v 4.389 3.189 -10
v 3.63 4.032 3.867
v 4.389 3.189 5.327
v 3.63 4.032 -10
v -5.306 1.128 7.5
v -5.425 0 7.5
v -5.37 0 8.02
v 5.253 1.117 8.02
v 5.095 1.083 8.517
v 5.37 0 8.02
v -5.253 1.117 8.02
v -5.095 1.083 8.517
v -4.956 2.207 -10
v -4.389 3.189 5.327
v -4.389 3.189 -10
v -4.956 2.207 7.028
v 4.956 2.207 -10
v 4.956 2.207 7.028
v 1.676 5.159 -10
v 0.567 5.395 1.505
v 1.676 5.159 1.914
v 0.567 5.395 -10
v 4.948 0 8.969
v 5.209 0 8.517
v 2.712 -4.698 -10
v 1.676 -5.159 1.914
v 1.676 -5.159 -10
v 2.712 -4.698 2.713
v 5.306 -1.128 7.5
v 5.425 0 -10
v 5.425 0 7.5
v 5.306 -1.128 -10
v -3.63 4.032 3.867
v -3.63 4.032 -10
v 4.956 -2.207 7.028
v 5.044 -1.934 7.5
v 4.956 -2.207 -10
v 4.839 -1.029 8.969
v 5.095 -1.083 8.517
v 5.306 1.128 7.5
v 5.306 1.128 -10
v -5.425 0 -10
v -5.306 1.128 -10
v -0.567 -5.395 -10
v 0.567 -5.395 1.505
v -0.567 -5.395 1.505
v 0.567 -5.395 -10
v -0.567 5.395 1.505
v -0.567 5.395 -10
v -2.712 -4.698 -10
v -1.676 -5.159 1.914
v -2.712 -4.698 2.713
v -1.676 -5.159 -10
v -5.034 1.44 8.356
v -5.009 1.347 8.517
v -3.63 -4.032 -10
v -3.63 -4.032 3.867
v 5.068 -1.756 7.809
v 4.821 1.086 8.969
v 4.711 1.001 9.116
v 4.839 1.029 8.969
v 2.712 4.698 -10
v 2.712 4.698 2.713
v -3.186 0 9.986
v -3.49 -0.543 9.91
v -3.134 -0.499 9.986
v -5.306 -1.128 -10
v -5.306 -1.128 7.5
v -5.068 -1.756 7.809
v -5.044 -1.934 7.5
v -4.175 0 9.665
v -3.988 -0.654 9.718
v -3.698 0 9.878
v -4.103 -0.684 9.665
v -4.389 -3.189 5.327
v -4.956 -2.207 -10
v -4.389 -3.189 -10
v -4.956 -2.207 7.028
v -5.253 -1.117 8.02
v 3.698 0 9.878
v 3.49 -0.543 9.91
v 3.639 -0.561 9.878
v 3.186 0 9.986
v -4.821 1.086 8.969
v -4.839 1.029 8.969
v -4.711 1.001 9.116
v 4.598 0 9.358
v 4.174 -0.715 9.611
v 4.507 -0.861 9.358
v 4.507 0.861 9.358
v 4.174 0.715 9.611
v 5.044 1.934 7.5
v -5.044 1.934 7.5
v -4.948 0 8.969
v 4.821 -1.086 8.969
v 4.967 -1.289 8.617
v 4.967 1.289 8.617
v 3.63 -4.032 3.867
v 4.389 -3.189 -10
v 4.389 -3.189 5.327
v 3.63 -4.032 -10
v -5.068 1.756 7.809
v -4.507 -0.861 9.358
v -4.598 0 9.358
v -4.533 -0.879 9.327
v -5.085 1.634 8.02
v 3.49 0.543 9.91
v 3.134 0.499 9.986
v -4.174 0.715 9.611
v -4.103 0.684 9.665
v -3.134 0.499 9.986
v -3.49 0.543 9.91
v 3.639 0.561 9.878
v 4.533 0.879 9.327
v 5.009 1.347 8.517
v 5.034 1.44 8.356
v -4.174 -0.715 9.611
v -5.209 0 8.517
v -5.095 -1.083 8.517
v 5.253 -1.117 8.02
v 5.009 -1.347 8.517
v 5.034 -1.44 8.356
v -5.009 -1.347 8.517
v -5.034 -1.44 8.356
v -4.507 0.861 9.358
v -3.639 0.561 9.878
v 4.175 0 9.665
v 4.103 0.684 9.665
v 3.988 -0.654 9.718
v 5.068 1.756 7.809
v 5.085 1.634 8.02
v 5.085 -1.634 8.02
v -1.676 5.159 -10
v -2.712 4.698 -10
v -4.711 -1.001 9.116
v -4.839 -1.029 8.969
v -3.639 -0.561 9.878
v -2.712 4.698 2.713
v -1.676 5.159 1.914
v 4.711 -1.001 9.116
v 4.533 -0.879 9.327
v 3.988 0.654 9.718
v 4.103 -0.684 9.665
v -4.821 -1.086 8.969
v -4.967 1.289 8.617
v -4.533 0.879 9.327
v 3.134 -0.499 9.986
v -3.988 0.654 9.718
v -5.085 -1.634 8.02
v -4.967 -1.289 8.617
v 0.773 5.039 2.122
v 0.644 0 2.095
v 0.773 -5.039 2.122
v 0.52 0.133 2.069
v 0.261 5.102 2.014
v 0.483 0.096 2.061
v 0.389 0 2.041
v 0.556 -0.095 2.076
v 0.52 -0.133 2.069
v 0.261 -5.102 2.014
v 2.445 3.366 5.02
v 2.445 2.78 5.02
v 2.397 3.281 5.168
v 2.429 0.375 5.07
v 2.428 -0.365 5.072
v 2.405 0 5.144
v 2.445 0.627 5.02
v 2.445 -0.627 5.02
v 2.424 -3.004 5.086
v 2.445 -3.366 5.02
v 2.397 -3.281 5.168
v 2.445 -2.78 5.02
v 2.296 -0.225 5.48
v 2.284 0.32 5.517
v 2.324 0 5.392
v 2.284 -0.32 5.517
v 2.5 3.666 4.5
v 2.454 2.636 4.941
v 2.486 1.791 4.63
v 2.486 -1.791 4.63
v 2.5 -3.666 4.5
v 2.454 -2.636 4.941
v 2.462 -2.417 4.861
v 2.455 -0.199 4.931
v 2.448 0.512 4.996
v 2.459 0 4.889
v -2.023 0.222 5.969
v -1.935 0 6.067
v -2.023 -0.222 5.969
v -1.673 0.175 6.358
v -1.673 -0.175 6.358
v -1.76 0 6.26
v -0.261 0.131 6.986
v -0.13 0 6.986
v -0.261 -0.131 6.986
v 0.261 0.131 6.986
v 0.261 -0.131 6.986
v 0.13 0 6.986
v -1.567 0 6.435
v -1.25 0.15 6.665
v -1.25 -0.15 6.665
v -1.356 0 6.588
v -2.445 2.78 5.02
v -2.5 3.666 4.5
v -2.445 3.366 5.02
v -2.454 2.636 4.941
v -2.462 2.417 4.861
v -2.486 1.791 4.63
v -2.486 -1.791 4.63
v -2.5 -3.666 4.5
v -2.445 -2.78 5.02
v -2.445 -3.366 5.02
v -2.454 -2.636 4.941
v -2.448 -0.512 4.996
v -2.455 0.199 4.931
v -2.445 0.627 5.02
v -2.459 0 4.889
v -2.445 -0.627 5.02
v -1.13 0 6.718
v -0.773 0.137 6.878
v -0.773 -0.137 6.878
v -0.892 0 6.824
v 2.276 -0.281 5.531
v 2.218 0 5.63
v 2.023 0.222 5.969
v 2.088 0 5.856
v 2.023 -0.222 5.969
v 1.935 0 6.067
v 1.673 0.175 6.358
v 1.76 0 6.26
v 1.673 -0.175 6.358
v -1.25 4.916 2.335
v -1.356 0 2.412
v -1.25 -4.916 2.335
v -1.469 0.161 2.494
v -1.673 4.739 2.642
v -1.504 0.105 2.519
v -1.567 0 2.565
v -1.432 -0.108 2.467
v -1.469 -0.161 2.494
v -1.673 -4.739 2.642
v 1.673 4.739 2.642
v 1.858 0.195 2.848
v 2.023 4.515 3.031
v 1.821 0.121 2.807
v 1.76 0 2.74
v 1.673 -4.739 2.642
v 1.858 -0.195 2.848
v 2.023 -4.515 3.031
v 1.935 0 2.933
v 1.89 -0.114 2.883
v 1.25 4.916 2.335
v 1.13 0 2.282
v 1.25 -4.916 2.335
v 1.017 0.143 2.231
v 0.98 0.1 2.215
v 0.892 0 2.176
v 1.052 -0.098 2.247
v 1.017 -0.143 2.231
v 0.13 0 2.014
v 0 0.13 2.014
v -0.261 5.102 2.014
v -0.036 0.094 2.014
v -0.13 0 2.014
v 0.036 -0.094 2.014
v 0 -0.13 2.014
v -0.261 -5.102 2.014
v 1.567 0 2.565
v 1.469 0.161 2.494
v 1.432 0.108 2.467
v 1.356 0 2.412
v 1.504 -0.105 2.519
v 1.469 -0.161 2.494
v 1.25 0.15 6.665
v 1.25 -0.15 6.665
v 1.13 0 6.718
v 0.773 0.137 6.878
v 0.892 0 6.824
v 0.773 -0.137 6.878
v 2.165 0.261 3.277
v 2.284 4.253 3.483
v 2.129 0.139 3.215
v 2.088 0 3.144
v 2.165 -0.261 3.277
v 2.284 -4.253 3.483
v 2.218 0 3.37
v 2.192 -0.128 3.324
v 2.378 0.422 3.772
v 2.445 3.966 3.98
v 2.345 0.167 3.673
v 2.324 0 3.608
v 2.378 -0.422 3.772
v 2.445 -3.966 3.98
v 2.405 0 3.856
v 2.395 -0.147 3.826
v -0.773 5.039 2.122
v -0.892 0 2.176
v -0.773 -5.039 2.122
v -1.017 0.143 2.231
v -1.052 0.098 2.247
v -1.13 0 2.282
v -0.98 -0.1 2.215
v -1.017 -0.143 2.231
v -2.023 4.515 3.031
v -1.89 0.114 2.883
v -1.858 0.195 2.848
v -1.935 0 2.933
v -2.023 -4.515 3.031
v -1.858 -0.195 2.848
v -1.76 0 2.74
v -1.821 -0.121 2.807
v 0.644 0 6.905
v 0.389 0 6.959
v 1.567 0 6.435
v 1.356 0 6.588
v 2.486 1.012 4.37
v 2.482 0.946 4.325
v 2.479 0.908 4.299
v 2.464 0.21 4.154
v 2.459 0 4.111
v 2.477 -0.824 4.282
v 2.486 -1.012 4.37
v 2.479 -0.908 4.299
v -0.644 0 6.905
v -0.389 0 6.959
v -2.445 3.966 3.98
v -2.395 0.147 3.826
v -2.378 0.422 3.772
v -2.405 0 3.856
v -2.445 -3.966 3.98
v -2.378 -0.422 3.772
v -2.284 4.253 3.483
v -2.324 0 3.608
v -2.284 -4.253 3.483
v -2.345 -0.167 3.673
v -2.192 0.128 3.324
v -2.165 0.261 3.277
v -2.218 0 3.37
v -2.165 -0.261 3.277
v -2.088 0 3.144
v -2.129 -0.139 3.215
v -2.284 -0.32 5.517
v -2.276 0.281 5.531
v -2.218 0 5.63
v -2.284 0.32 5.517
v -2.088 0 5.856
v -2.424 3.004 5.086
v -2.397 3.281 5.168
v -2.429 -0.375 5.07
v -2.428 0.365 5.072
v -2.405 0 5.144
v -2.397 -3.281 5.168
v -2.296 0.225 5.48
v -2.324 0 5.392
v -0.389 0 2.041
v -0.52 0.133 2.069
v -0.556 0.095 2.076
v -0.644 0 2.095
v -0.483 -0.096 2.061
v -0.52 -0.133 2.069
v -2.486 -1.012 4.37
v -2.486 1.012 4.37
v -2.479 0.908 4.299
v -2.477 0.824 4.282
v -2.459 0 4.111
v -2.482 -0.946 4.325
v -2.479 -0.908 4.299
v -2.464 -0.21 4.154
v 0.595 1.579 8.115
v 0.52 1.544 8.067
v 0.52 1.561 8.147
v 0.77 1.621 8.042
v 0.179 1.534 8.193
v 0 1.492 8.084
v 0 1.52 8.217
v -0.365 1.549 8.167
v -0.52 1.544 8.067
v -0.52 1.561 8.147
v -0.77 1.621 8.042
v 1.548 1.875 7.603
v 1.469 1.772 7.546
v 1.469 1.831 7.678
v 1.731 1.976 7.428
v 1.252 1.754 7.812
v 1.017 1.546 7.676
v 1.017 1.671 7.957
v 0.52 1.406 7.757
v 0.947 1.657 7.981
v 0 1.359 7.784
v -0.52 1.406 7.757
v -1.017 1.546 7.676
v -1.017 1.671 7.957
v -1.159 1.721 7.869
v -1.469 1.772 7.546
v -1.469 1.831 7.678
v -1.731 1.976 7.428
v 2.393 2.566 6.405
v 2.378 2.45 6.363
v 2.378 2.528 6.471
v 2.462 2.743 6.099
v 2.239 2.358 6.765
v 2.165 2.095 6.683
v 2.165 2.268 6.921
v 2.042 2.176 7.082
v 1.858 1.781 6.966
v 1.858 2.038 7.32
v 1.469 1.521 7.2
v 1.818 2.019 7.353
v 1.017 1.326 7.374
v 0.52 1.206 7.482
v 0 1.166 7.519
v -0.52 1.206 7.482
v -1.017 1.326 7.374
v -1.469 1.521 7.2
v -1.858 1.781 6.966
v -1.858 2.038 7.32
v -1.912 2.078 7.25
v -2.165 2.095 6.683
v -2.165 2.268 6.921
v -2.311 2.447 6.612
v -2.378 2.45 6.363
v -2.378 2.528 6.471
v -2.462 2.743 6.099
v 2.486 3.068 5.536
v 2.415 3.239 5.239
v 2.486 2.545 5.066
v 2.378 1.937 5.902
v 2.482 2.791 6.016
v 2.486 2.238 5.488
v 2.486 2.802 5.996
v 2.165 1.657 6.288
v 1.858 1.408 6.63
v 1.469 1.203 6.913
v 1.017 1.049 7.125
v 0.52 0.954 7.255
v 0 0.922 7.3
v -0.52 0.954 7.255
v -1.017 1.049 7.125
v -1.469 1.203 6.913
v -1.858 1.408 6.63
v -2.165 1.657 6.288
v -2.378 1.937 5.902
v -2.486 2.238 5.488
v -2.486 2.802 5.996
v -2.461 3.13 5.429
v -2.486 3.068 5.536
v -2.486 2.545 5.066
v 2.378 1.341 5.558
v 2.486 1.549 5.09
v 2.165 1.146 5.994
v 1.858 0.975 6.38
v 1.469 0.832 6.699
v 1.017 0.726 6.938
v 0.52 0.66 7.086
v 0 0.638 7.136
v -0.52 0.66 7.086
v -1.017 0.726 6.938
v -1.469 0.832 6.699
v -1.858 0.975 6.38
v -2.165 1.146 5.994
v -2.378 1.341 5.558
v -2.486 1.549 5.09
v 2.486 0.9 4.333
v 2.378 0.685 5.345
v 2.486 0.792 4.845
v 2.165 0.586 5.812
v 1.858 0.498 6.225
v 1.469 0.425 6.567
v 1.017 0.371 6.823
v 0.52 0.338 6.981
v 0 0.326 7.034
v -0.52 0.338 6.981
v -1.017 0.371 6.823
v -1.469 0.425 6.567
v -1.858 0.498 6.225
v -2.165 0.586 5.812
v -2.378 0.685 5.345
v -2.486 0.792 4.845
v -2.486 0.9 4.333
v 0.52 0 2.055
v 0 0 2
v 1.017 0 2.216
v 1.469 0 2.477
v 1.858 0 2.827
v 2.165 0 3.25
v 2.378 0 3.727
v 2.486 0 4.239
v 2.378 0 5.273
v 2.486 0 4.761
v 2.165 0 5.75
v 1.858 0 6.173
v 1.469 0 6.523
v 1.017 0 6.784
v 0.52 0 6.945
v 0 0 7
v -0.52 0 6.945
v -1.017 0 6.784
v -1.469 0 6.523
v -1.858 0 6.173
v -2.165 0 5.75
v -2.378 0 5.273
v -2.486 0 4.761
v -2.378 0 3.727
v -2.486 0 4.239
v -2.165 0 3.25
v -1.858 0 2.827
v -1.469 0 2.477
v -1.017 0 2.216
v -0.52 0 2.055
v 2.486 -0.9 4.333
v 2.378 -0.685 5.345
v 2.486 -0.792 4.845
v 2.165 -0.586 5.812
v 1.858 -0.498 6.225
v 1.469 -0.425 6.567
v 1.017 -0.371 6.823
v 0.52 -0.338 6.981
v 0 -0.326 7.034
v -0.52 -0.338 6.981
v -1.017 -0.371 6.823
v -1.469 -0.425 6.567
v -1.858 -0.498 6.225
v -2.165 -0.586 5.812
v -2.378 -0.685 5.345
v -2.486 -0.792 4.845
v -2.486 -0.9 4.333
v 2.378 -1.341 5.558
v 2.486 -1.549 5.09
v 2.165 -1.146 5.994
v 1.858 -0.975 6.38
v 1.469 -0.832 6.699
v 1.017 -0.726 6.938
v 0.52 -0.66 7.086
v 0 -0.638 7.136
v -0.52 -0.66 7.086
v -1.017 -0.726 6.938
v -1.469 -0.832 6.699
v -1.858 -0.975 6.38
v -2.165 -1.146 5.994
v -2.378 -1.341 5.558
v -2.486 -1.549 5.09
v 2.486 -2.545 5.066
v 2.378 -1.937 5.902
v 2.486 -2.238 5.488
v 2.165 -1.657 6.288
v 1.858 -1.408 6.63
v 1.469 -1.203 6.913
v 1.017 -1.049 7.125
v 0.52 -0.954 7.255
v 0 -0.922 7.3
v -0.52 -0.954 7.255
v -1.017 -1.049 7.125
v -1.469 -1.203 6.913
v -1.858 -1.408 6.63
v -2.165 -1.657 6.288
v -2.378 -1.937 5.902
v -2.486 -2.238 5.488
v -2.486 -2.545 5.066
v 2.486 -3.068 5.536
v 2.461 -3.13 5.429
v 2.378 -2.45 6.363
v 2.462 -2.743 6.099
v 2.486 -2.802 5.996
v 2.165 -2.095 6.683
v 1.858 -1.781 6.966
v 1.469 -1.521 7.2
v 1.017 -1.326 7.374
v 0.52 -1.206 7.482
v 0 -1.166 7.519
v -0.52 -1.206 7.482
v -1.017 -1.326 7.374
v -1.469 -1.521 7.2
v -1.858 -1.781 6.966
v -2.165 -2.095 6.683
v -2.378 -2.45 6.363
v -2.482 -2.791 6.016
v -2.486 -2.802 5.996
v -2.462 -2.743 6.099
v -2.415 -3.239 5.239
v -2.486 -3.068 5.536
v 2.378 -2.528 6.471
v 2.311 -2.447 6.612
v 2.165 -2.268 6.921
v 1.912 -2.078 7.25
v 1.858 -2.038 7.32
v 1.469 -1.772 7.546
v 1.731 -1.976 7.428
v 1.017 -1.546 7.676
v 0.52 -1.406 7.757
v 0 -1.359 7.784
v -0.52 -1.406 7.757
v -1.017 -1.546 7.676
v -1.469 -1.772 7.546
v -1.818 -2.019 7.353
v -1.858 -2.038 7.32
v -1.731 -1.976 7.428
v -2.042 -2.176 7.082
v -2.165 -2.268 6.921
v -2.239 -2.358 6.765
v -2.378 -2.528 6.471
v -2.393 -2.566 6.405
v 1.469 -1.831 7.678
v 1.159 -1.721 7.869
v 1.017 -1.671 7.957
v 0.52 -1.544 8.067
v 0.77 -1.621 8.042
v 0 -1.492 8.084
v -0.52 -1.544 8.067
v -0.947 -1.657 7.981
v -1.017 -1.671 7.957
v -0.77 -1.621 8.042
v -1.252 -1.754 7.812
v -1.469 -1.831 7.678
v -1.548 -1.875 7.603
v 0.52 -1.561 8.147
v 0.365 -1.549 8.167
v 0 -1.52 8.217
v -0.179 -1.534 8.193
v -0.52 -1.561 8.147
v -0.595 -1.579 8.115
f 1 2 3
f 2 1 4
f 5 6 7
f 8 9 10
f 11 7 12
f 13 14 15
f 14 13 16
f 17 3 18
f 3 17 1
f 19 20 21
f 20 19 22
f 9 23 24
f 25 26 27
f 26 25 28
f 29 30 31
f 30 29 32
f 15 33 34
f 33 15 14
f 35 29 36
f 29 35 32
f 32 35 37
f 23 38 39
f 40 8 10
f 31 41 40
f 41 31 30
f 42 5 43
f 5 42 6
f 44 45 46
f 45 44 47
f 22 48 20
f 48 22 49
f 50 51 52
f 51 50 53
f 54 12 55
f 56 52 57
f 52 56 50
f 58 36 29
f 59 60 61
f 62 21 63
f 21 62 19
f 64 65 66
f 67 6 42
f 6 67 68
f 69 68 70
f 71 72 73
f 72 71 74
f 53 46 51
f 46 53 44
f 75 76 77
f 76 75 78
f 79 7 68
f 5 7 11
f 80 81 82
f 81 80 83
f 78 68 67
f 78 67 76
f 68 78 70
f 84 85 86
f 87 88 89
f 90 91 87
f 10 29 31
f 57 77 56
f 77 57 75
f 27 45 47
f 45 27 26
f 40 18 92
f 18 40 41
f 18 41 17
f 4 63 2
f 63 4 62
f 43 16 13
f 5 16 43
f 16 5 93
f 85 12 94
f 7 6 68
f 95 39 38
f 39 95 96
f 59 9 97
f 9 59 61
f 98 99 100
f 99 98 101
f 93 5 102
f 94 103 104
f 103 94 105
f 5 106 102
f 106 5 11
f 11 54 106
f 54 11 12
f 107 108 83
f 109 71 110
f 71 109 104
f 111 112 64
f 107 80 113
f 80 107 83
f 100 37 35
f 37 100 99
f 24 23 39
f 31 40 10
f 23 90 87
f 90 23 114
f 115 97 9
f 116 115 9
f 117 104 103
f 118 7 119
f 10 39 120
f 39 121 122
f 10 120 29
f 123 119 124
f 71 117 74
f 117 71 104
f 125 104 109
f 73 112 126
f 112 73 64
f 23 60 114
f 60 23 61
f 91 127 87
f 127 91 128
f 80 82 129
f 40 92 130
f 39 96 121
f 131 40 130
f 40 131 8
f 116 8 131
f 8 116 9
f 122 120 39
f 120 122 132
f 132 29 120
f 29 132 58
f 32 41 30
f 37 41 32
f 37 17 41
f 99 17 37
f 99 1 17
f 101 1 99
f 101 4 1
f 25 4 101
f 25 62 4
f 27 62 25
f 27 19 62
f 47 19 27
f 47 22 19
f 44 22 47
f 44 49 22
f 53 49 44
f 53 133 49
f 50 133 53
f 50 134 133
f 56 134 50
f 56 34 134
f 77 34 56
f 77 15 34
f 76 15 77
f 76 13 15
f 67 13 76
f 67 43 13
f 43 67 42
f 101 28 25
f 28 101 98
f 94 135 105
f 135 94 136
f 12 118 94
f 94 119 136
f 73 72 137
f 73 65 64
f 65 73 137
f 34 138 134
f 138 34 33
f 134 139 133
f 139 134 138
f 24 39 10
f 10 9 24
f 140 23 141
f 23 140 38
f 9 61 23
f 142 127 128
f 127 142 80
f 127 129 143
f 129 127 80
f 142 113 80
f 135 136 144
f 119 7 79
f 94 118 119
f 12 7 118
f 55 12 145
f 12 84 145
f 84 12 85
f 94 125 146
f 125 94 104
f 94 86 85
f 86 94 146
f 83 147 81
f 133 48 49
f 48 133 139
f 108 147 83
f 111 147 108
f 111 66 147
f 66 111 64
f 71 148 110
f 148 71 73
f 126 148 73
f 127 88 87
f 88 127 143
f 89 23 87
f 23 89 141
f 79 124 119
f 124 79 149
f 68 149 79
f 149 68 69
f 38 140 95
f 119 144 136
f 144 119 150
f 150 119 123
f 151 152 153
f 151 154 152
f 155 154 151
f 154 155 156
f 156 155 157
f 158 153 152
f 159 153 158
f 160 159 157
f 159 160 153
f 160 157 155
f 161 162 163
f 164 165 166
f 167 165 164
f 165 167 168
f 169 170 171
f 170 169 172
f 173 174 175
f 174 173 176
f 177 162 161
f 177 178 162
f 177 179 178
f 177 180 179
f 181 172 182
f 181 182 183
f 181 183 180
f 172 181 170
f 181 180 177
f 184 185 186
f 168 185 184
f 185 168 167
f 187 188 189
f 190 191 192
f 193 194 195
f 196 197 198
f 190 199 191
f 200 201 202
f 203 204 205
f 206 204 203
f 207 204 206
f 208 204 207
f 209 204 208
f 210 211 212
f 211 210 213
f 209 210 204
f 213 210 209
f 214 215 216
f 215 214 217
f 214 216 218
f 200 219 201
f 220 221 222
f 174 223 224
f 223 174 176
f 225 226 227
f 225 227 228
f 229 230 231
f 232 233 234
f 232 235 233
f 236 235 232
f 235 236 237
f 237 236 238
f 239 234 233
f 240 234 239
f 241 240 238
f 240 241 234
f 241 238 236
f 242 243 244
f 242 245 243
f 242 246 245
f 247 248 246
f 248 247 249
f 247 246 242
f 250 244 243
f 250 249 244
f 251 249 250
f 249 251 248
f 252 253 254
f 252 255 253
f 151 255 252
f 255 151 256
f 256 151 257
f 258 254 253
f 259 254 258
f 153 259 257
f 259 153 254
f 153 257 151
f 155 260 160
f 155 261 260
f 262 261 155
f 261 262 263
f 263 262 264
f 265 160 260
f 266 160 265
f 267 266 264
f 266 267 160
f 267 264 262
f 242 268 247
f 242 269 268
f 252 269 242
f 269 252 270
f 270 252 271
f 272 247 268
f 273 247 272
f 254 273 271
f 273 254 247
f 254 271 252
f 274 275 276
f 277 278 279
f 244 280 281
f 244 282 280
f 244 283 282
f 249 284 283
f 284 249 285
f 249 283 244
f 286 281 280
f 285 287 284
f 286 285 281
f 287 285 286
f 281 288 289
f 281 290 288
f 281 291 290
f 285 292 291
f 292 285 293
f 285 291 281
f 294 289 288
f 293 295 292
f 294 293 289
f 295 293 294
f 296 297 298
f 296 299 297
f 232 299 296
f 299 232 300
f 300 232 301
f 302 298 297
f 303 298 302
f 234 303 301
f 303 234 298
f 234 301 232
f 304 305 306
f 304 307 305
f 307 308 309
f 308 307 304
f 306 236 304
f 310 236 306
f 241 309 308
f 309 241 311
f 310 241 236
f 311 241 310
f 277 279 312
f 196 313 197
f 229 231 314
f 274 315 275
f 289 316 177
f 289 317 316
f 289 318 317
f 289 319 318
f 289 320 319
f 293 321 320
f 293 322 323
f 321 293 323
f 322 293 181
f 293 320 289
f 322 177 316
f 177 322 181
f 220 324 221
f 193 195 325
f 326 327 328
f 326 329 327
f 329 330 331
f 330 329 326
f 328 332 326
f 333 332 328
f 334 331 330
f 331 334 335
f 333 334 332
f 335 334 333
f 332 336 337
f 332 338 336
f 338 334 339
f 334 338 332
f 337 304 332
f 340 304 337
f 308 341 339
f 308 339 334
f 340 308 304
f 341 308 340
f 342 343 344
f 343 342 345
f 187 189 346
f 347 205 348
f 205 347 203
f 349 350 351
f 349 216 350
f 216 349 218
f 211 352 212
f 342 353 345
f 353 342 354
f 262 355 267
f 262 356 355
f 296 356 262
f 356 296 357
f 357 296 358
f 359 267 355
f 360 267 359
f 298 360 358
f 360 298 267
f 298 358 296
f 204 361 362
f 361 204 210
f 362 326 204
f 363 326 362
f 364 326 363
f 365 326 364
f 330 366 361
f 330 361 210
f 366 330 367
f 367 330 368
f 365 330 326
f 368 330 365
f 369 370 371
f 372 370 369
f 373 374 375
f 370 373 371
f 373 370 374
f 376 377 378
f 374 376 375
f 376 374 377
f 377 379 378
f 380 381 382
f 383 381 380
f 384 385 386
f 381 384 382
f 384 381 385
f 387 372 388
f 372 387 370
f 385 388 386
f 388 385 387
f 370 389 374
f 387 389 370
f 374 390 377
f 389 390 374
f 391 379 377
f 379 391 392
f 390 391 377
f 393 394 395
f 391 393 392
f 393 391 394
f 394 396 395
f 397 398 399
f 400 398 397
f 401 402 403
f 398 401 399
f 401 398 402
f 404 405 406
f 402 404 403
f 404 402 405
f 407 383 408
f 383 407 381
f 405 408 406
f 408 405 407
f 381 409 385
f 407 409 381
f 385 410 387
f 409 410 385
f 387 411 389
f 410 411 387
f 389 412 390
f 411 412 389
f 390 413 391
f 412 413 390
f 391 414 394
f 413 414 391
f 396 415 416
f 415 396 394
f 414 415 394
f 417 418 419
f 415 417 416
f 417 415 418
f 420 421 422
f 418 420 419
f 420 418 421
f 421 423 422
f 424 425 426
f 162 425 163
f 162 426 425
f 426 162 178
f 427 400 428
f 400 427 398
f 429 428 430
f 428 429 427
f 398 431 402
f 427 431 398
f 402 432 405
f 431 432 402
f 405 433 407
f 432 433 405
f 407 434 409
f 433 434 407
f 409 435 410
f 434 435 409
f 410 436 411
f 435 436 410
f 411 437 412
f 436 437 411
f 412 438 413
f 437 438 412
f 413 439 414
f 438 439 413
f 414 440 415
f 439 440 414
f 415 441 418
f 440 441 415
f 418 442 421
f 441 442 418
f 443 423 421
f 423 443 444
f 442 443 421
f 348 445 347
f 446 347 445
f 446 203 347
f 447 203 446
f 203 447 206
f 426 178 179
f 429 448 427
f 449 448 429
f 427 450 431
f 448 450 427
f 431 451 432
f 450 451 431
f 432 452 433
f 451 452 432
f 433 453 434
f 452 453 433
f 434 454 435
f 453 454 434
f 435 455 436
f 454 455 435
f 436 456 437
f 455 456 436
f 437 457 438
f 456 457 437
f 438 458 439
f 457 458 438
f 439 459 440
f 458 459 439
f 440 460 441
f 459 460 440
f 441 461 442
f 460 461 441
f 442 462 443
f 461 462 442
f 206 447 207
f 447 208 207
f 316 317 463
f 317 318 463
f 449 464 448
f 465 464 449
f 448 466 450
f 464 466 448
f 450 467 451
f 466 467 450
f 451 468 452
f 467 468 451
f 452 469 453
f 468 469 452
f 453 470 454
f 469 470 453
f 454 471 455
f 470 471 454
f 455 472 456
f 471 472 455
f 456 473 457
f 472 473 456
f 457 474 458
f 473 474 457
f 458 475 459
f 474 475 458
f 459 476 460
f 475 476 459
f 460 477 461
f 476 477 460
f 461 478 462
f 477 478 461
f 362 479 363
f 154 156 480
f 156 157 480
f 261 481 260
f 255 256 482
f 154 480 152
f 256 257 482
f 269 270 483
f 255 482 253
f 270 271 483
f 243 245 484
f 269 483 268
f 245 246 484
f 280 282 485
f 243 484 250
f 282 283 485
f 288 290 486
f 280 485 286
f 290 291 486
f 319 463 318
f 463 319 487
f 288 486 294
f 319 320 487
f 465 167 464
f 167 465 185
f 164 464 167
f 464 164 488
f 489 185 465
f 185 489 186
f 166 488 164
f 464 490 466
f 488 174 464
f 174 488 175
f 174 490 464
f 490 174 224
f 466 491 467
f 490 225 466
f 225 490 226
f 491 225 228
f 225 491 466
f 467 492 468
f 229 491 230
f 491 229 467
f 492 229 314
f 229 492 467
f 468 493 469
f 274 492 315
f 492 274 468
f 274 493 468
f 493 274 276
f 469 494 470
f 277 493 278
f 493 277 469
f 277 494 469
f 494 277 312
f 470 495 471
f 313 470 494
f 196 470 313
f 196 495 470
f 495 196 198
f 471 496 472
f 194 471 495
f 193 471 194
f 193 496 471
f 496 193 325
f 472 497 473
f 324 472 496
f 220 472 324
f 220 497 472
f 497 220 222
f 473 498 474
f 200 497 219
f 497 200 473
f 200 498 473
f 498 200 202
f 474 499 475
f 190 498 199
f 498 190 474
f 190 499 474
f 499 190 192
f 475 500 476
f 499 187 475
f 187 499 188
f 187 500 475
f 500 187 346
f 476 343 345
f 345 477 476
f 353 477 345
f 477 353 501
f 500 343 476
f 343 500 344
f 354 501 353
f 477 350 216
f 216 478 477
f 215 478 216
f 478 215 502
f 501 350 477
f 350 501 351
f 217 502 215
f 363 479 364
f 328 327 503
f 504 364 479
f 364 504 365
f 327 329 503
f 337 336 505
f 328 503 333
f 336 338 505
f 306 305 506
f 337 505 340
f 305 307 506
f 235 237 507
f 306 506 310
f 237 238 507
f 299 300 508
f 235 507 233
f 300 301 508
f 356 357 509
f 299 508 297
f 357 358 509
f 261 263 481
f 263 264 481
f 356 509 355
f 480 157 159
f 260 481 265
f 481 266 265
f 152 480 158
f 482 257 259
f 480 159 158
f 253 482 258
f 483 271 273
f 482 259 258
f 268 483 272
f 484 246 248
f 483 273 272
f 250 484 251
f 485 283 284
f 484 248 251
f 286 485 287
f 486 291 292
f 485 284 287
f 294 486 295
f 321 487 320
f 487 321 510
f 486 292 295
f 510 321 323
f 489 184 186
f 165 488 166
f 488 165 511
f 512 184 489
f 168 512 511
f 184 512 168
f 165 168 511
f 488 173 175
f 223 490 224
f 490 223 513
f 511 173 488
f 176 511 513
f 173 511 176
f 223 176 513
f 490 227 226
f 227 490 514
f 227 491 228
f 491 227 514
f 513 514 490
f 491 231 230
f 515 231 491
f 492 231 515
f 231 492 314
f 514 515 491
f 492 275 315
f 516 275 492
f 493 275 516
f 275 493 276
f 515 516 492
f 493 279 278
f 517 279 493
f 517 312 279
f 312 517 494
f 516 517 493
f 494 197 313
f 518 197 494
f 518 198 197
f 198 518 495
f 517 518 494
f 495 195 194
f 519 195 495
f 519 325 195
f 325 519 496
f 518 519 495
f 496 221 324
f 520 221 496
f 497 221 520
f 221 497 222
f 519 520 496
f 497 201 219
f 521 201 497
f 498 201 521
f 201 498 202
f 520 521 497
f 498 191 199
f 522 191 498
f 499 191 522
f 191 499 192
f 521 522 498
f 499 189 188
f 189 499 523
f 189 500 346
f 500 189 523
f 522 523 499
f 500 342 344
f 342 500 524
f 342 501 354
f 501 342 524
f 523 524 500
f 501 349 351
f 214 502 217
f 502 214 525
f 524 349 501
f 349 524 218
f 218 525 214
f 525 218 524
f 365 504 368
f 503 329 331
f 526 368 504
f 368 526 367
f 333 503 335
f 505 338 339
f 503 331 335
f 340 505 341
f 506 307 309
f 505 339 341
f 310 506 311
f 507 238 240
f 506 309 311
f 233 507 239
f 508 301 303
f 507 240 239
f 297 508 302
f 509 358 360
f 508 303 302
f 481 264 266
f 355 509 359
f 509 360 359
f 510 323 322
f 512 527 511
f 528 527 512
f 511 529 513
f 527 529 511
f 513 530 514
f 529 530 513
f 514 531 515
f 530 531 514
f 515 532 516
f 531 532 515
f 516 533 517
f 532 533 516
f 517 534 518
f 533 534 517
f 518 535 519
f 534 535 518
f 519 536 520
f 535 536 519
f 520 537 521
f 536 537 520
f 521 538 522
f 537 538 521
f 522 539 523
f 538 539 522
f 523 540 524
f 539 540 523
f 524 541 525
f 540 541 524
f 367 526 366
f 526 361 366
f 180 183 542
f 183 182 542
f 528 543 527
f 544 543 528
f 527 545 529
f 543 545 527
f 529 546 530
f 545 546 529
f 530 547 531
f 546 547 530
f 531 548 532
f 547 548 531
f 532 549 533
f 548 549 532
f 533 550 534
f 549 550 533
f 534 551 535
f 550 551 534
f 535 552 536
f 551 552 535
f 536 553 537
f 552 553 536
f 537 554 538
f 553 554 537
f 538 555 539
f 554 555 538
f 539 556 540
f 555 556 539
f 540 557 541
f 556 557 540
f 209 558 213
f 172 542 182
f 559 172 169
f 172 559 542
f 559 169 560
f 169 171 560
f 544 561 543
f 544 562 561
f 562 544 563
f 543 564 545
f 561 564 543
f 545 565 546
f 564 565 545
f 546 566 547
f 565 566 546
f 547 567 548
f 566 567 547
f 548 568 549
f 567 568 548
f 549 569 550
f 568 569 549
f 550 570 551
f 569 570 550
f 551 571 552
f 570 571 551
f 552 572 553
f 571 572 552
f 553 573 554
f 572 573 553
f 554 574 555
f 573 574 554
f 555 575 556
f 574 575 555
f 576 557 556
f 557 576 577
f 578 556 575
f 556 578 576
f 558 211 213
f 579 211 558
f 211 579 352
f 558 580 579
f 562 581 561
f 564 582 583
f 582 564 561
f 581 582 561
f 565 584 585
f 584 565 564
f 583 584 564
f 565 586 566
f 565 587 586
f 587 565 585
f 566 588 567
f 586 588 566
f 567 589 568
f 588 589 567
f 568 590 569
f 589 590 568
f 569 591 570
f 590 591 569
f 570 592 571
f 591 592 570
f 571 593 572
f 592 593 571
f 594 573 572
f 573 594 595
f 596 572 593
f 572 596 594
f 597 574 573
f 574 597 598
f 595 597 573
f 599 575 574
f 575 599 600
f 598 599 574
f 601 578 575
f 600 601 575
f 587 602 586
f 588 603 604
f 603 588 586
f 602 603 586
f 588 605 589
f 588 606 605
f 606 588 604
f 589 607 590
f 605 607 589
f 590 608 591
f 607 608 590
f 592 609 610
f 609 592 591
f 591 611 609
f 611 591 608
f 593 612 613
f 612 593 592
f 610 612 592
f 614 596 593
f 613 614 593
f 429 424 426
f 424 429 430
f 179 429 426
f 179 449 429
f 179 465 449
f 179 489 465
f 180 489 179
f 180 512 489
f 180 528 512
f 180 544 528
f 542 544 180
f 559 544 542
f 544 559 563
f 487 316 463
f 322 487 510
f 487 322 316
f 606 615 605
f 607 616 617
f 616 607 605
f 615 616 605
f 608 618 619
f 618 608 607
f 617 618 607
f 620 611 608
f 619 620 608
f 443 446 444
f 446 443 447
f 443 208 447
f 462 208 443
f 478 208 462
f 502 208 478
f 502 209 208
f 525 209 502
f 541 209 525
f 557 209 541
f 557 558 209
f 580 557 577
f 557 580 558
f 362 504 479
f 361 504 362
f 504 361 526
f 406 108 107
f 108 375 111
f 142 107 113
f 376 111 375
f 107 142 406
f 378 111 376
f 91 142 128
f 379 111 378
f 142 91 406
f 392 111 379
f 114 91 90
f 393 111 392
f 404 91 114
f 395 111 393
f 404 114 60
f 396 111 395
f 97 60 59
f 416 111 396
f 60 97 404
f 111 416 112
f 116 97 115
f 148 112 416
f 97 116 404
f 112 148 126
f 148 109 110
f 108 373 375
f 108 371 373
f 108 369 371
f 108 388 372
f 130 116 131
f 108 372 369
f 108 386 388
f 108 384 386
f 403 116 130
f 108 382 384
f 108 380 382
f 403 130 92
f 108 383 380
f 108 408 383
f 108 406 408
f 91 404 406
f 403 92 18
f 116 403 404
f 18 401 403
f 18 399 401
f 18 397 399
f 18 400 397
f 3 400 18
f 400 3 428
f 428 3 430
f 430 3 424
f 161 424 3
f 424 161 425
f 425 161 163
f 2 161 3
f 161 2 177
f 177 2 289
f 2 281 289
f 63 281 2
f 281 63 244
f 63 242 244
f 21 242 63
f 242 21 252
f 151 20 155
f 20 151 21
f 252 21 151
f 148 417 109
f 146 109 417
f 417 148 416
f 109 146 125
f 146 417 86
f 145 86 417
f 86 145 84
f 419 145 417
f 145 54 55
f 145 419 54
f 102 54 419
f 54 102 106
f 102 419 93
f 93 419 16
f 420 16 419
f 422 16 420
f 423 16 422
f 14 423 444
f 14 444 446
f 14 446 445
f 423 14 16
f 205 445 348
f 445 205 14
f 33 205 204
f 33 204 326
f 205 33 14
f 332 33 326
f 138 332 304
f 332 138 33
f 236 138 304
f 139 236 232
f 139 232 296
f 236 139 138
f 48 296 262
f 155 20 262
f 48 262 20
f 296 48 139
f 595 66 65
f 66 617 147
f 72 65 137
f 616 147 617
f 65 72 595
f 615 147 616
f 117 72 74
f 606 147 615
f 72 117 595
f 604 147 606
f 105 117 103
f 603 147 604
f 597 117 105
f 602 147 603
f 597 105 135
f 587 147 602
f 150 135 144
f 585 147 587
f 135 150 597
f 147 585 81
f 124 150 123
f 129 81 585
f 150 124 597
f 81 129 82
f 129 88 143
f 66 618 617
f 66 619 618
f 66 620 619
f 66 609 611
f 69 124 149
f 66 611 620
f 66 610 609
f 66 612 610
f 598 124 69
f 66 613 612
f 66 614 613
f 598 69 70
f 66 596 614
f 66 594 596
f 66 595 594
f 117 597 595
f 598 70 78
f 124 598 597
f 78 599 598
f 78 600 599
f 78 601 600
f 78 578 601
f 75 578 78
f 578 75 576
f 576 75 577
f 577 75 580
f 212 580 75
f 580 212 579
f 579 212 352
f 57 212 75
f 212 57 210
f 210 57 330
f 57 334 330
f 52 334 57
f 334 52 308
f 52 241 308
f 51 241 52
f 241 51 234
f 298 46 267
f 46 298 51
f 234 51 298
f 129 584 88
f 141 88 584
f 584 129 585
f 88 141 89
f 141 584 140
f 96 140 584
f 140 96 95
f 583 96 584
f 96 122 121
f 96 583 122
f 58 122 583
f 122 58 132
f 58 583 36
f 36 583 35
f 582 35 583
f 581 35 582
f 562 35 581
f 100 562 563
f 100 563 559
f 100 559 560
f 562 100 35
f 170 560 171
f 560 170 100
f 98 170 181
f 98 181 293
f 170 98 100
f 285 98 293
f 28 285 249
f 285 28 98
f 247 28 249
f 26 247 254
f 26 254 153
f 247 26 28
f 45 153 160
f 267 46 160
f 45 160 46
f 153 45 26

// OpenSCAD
// file: rounded_cylinder.scad
// Modules for generating a rounded cylinder, rounded disc, and torus
// Author: Philip B Chase, <philipbchase@gmail.com>

/* License: To the extent possible under law, Philip B Chase has waived all copyright and related or neighboring rights to modules to generate a rounded cylinder, rounded disc, and torus. This work is published from: United States.  See: http://creativecommons.org/publicdomain/zero/1.0/

Usage:

    $fn=30;
    height=10;
    major_radius=7;
    minor_radius=3;

    rounded_cylinder(height, major_radius, minor_radius);

      or

    rounded_disc(major_radius, minor_radius);

*/


module rounded_cylinder(height, major_radius, minor_radius) {
    // height is the total height of the cylinder
    // major_radius is the radius of the flat zone at the top and bottom of the cylinder
    // minor_radius is the radius of curvature of the rounded edges
    // the radius of the cylinder is major_radius + minor_radius
    // the cylinder is centered at [0,0,0]
    torus_displacement = 0.5 * height - minor_radius;
    hull(){
        translate([0,0,torus_displacement])
            torus(major_radius, minor_radius);
        translate([0,0,-torus_displacement])
            torus(major_radius, minor_radius);
    }
}

module rounded_cylinder_2(height, cylinder_major_radius, torus_minor_radius) {
    // height is the total height of the cylinder
    // cylinder_major_radius is the overall radius of the cylinder--not the torus
    // minor_radius is the radius of curvature of the rounded edges
    // the cylinder is centered at [0,0,0]
    torus_displacement = 0.5 * height - torus_minor_radius;
    torus_major_radius = cylinder_major_radius - torus_minor_radius;
    hull(){
        translate([0,0,torus_displacement])
            torus(torus_major_radius, torus_minor_radius);
        translate([0,0,-torus_displacement])
            torus(torus_major_radius, torus_minor_radius);
    }
}

module half_rounded_cylinder(height, cylinder_major_radius, torus_minor_radius) {
    // height is the total height of the cylinder
    // cylinder_major_radius is the overall radius of the cylinder--not the torus
    // minor_radius is the radius of curvature of the rounded edges
    // Constraints
    //   height >= torus_minor_radius
    //   cylinder_major_radius > 2 * torus_minor_radius
    // The cylinder is centered at [0,0,0]
    
    torus_displacement = 0.5 * height - torus_minor_radius;
    cylinder_height = 0.001*torus_minor_radius;
    cylinder_displacement = - 0.5 * height + 0.5 * cylinder_height;
    torus_major_radius = cylinder_major_radius - torus_minor_radius;

    hull(){
        difference() {
            translate([0,0,torus_displacement])
            torus(torus_major_radius, torus_minor_radius);
            translate([0,0,torus_displacement - 0.5 * torus_minor_radius])
                cylinder(h=torus_minor_radius, r=cylinder_major_radius, center=true);
        }
        translate([0,0,cylinder_displacement])
            cylinder(h=cylinder_height, r=cylinder_major_radius, center=true);
    }
}


module rounded_disc(major_radius, minor_radius) {
    // the disc is centered at [0,0,0]
    hull() {
        torus(major_radius, minor_radius);
    }
}

module torus(major_radius, minor_radius){
    // minor_radius is the radius of the cross section of the torus
    // major_radius is the radius torus
    //$fn=30;
    rotate_extrude(convexity = 10)
        translate([major_radius,0,0])
            circle(minor_radius);
}
// main file
// 3D model for a Peter Lynn Twinskin Spar End
// These spar ends are designed the replace the factory-supplied spar ends commonly used in the Peter Lynn Twinskin series kites manufactured by Vliegerop. 
// Make four per kite
// Author: Philip B Chase, <philipbchase@gmail.com>
/* This component functions as a replacement for the factory-supplied spar end in the blue, 12.5 mm OD spars supplied with the Peter Lynn Twinskin series kites manufactured by Vliegerop. The kites that use these spars are the Venom, Vortex, Venom II, Scorpion, Synergy, Charger, Phantom II, and Charger II. One should be used at each end of a blue, 12.5mm OD aluminum spar as found in a Peter Lynn Twinskin. Each end of the internal bungie cord should be passed through the cross bore and tied off. The reduce diamter of the main body should slide into the spar end. The domed end should keep the spar end from going any further inside the spar. The dome protects end of the fabric pocket from the end of the spar. This reduces the risk of the spar punching through the pocket in a nose-down crash. 

    This component should be printed with 100% infill.

*/
/* License: To the extent possible under law, Philip B Chase has waived all copyright and related or neighboring rights to 3D model for a Peter Lynn Twinskin Spar End. This work is published from: United States.  See: http://creativecommons.org/publicdomain/zero/1.0/
*/

use <rounded_cylinder.scad>;

$fn=30;

// Body dimensions
id_od_interference = 0.15;
overall_width = 11 - id_od_interference;  // x
overall_depth = overall_width;  // y
overall_major_radius = overall_width / 2;
overall_height = 20; // z
// radii of block corners and edges
r_body = 2.5;


cross_bore_radius = 5.0 / 2;
cross_bore_torus_major_radius = 0.375 * overall_width;
cross_bore_z_offset = 0.35 * overall_height - cross_bore_radius + cross_bore_torus_major_radius; 

pin_bore_length = overall_depth + 2;
pin_bore_z_offset = 0.35 * overall_height - cross_bore_radius;

// interior bevel dimensions
bevel_size_x = overall_width;
bevel_size_y = overall_width;
bevel_size_z = 0.5 * overall_height;
bevel_y_offset = 1.0 * overall_width;
bevel_z_offset = 0.18 * overall_height;
bevel_x_rotation = 30;

// cap dimensions
cap_overall_width = 12.5;
cap_major_radius = cap_overall_width / 2 ;
cap_overall_height = 4;
cap_radius_of_edges = 3;

difference() {
    half_rounded_cylinder(overall_height, overall_major_radius, r_body);
    pin_bore(cross_bore_radius, pin_bore_length, pin_bore_z_offset);
    cross_bore(cross_bore_torus_major_radius, cross_bore_radius, cross_bore_z_offset);
    interior_bevel(bevel_size_x, bevel_size_y, bevel_size_z, bevel_z_offset, bevel_y_offset, bevel_x_rotation, 0);
    interior_bevel(bevel_size_x, bevel_size_y, bevel_size_z, bevel_z_offset, bevel_y_offset, bevel_x_rotation, 180);
}

cap(cap_overall_height, cap_major_radius, cap_radius_of_edges, overall_height);

module cross_bore(cross_bore_torus_major_radius, cross_bore_radius, cross_bore_z_offset) {
    translate([0,0,cross_bore_z_offset])
        rotate([0,90,0])
            torus(cross_bore_torus_major_radius, cross_bore_radius);
}

module cap(cap_overall_height, cap_major_radius, cap_radius_of_edges, overall_height) {
    translate([0,0,-0.5 * overall_height - 0.5 * cap_overall_height])
        rotate([180,0,0])
            %half_rounded_cylinder(cap_overall_height, cap_major_radius, cap_radius_of_edges);
}

module interior_bevel(bevel_size_x, bevel_size_y, bevel_size_z, bevel_z_offset, bevel_y_offset, bevel_x_rotation, z_rotation) {
    rotate([bevel_x_rotation,0,z_rotation])
        translate([0,bevel_y_offset,bevel_z_offset])
            cube([bevel_size_x, bevel_size_y, bevel_size_z], center=true);
}

module pin_bore(radius, length, z_offset) {
    translate([0,0,z_offset])
        rotate([90,0,0])
            cylinder(h=length, r=radius, center=true);
}
